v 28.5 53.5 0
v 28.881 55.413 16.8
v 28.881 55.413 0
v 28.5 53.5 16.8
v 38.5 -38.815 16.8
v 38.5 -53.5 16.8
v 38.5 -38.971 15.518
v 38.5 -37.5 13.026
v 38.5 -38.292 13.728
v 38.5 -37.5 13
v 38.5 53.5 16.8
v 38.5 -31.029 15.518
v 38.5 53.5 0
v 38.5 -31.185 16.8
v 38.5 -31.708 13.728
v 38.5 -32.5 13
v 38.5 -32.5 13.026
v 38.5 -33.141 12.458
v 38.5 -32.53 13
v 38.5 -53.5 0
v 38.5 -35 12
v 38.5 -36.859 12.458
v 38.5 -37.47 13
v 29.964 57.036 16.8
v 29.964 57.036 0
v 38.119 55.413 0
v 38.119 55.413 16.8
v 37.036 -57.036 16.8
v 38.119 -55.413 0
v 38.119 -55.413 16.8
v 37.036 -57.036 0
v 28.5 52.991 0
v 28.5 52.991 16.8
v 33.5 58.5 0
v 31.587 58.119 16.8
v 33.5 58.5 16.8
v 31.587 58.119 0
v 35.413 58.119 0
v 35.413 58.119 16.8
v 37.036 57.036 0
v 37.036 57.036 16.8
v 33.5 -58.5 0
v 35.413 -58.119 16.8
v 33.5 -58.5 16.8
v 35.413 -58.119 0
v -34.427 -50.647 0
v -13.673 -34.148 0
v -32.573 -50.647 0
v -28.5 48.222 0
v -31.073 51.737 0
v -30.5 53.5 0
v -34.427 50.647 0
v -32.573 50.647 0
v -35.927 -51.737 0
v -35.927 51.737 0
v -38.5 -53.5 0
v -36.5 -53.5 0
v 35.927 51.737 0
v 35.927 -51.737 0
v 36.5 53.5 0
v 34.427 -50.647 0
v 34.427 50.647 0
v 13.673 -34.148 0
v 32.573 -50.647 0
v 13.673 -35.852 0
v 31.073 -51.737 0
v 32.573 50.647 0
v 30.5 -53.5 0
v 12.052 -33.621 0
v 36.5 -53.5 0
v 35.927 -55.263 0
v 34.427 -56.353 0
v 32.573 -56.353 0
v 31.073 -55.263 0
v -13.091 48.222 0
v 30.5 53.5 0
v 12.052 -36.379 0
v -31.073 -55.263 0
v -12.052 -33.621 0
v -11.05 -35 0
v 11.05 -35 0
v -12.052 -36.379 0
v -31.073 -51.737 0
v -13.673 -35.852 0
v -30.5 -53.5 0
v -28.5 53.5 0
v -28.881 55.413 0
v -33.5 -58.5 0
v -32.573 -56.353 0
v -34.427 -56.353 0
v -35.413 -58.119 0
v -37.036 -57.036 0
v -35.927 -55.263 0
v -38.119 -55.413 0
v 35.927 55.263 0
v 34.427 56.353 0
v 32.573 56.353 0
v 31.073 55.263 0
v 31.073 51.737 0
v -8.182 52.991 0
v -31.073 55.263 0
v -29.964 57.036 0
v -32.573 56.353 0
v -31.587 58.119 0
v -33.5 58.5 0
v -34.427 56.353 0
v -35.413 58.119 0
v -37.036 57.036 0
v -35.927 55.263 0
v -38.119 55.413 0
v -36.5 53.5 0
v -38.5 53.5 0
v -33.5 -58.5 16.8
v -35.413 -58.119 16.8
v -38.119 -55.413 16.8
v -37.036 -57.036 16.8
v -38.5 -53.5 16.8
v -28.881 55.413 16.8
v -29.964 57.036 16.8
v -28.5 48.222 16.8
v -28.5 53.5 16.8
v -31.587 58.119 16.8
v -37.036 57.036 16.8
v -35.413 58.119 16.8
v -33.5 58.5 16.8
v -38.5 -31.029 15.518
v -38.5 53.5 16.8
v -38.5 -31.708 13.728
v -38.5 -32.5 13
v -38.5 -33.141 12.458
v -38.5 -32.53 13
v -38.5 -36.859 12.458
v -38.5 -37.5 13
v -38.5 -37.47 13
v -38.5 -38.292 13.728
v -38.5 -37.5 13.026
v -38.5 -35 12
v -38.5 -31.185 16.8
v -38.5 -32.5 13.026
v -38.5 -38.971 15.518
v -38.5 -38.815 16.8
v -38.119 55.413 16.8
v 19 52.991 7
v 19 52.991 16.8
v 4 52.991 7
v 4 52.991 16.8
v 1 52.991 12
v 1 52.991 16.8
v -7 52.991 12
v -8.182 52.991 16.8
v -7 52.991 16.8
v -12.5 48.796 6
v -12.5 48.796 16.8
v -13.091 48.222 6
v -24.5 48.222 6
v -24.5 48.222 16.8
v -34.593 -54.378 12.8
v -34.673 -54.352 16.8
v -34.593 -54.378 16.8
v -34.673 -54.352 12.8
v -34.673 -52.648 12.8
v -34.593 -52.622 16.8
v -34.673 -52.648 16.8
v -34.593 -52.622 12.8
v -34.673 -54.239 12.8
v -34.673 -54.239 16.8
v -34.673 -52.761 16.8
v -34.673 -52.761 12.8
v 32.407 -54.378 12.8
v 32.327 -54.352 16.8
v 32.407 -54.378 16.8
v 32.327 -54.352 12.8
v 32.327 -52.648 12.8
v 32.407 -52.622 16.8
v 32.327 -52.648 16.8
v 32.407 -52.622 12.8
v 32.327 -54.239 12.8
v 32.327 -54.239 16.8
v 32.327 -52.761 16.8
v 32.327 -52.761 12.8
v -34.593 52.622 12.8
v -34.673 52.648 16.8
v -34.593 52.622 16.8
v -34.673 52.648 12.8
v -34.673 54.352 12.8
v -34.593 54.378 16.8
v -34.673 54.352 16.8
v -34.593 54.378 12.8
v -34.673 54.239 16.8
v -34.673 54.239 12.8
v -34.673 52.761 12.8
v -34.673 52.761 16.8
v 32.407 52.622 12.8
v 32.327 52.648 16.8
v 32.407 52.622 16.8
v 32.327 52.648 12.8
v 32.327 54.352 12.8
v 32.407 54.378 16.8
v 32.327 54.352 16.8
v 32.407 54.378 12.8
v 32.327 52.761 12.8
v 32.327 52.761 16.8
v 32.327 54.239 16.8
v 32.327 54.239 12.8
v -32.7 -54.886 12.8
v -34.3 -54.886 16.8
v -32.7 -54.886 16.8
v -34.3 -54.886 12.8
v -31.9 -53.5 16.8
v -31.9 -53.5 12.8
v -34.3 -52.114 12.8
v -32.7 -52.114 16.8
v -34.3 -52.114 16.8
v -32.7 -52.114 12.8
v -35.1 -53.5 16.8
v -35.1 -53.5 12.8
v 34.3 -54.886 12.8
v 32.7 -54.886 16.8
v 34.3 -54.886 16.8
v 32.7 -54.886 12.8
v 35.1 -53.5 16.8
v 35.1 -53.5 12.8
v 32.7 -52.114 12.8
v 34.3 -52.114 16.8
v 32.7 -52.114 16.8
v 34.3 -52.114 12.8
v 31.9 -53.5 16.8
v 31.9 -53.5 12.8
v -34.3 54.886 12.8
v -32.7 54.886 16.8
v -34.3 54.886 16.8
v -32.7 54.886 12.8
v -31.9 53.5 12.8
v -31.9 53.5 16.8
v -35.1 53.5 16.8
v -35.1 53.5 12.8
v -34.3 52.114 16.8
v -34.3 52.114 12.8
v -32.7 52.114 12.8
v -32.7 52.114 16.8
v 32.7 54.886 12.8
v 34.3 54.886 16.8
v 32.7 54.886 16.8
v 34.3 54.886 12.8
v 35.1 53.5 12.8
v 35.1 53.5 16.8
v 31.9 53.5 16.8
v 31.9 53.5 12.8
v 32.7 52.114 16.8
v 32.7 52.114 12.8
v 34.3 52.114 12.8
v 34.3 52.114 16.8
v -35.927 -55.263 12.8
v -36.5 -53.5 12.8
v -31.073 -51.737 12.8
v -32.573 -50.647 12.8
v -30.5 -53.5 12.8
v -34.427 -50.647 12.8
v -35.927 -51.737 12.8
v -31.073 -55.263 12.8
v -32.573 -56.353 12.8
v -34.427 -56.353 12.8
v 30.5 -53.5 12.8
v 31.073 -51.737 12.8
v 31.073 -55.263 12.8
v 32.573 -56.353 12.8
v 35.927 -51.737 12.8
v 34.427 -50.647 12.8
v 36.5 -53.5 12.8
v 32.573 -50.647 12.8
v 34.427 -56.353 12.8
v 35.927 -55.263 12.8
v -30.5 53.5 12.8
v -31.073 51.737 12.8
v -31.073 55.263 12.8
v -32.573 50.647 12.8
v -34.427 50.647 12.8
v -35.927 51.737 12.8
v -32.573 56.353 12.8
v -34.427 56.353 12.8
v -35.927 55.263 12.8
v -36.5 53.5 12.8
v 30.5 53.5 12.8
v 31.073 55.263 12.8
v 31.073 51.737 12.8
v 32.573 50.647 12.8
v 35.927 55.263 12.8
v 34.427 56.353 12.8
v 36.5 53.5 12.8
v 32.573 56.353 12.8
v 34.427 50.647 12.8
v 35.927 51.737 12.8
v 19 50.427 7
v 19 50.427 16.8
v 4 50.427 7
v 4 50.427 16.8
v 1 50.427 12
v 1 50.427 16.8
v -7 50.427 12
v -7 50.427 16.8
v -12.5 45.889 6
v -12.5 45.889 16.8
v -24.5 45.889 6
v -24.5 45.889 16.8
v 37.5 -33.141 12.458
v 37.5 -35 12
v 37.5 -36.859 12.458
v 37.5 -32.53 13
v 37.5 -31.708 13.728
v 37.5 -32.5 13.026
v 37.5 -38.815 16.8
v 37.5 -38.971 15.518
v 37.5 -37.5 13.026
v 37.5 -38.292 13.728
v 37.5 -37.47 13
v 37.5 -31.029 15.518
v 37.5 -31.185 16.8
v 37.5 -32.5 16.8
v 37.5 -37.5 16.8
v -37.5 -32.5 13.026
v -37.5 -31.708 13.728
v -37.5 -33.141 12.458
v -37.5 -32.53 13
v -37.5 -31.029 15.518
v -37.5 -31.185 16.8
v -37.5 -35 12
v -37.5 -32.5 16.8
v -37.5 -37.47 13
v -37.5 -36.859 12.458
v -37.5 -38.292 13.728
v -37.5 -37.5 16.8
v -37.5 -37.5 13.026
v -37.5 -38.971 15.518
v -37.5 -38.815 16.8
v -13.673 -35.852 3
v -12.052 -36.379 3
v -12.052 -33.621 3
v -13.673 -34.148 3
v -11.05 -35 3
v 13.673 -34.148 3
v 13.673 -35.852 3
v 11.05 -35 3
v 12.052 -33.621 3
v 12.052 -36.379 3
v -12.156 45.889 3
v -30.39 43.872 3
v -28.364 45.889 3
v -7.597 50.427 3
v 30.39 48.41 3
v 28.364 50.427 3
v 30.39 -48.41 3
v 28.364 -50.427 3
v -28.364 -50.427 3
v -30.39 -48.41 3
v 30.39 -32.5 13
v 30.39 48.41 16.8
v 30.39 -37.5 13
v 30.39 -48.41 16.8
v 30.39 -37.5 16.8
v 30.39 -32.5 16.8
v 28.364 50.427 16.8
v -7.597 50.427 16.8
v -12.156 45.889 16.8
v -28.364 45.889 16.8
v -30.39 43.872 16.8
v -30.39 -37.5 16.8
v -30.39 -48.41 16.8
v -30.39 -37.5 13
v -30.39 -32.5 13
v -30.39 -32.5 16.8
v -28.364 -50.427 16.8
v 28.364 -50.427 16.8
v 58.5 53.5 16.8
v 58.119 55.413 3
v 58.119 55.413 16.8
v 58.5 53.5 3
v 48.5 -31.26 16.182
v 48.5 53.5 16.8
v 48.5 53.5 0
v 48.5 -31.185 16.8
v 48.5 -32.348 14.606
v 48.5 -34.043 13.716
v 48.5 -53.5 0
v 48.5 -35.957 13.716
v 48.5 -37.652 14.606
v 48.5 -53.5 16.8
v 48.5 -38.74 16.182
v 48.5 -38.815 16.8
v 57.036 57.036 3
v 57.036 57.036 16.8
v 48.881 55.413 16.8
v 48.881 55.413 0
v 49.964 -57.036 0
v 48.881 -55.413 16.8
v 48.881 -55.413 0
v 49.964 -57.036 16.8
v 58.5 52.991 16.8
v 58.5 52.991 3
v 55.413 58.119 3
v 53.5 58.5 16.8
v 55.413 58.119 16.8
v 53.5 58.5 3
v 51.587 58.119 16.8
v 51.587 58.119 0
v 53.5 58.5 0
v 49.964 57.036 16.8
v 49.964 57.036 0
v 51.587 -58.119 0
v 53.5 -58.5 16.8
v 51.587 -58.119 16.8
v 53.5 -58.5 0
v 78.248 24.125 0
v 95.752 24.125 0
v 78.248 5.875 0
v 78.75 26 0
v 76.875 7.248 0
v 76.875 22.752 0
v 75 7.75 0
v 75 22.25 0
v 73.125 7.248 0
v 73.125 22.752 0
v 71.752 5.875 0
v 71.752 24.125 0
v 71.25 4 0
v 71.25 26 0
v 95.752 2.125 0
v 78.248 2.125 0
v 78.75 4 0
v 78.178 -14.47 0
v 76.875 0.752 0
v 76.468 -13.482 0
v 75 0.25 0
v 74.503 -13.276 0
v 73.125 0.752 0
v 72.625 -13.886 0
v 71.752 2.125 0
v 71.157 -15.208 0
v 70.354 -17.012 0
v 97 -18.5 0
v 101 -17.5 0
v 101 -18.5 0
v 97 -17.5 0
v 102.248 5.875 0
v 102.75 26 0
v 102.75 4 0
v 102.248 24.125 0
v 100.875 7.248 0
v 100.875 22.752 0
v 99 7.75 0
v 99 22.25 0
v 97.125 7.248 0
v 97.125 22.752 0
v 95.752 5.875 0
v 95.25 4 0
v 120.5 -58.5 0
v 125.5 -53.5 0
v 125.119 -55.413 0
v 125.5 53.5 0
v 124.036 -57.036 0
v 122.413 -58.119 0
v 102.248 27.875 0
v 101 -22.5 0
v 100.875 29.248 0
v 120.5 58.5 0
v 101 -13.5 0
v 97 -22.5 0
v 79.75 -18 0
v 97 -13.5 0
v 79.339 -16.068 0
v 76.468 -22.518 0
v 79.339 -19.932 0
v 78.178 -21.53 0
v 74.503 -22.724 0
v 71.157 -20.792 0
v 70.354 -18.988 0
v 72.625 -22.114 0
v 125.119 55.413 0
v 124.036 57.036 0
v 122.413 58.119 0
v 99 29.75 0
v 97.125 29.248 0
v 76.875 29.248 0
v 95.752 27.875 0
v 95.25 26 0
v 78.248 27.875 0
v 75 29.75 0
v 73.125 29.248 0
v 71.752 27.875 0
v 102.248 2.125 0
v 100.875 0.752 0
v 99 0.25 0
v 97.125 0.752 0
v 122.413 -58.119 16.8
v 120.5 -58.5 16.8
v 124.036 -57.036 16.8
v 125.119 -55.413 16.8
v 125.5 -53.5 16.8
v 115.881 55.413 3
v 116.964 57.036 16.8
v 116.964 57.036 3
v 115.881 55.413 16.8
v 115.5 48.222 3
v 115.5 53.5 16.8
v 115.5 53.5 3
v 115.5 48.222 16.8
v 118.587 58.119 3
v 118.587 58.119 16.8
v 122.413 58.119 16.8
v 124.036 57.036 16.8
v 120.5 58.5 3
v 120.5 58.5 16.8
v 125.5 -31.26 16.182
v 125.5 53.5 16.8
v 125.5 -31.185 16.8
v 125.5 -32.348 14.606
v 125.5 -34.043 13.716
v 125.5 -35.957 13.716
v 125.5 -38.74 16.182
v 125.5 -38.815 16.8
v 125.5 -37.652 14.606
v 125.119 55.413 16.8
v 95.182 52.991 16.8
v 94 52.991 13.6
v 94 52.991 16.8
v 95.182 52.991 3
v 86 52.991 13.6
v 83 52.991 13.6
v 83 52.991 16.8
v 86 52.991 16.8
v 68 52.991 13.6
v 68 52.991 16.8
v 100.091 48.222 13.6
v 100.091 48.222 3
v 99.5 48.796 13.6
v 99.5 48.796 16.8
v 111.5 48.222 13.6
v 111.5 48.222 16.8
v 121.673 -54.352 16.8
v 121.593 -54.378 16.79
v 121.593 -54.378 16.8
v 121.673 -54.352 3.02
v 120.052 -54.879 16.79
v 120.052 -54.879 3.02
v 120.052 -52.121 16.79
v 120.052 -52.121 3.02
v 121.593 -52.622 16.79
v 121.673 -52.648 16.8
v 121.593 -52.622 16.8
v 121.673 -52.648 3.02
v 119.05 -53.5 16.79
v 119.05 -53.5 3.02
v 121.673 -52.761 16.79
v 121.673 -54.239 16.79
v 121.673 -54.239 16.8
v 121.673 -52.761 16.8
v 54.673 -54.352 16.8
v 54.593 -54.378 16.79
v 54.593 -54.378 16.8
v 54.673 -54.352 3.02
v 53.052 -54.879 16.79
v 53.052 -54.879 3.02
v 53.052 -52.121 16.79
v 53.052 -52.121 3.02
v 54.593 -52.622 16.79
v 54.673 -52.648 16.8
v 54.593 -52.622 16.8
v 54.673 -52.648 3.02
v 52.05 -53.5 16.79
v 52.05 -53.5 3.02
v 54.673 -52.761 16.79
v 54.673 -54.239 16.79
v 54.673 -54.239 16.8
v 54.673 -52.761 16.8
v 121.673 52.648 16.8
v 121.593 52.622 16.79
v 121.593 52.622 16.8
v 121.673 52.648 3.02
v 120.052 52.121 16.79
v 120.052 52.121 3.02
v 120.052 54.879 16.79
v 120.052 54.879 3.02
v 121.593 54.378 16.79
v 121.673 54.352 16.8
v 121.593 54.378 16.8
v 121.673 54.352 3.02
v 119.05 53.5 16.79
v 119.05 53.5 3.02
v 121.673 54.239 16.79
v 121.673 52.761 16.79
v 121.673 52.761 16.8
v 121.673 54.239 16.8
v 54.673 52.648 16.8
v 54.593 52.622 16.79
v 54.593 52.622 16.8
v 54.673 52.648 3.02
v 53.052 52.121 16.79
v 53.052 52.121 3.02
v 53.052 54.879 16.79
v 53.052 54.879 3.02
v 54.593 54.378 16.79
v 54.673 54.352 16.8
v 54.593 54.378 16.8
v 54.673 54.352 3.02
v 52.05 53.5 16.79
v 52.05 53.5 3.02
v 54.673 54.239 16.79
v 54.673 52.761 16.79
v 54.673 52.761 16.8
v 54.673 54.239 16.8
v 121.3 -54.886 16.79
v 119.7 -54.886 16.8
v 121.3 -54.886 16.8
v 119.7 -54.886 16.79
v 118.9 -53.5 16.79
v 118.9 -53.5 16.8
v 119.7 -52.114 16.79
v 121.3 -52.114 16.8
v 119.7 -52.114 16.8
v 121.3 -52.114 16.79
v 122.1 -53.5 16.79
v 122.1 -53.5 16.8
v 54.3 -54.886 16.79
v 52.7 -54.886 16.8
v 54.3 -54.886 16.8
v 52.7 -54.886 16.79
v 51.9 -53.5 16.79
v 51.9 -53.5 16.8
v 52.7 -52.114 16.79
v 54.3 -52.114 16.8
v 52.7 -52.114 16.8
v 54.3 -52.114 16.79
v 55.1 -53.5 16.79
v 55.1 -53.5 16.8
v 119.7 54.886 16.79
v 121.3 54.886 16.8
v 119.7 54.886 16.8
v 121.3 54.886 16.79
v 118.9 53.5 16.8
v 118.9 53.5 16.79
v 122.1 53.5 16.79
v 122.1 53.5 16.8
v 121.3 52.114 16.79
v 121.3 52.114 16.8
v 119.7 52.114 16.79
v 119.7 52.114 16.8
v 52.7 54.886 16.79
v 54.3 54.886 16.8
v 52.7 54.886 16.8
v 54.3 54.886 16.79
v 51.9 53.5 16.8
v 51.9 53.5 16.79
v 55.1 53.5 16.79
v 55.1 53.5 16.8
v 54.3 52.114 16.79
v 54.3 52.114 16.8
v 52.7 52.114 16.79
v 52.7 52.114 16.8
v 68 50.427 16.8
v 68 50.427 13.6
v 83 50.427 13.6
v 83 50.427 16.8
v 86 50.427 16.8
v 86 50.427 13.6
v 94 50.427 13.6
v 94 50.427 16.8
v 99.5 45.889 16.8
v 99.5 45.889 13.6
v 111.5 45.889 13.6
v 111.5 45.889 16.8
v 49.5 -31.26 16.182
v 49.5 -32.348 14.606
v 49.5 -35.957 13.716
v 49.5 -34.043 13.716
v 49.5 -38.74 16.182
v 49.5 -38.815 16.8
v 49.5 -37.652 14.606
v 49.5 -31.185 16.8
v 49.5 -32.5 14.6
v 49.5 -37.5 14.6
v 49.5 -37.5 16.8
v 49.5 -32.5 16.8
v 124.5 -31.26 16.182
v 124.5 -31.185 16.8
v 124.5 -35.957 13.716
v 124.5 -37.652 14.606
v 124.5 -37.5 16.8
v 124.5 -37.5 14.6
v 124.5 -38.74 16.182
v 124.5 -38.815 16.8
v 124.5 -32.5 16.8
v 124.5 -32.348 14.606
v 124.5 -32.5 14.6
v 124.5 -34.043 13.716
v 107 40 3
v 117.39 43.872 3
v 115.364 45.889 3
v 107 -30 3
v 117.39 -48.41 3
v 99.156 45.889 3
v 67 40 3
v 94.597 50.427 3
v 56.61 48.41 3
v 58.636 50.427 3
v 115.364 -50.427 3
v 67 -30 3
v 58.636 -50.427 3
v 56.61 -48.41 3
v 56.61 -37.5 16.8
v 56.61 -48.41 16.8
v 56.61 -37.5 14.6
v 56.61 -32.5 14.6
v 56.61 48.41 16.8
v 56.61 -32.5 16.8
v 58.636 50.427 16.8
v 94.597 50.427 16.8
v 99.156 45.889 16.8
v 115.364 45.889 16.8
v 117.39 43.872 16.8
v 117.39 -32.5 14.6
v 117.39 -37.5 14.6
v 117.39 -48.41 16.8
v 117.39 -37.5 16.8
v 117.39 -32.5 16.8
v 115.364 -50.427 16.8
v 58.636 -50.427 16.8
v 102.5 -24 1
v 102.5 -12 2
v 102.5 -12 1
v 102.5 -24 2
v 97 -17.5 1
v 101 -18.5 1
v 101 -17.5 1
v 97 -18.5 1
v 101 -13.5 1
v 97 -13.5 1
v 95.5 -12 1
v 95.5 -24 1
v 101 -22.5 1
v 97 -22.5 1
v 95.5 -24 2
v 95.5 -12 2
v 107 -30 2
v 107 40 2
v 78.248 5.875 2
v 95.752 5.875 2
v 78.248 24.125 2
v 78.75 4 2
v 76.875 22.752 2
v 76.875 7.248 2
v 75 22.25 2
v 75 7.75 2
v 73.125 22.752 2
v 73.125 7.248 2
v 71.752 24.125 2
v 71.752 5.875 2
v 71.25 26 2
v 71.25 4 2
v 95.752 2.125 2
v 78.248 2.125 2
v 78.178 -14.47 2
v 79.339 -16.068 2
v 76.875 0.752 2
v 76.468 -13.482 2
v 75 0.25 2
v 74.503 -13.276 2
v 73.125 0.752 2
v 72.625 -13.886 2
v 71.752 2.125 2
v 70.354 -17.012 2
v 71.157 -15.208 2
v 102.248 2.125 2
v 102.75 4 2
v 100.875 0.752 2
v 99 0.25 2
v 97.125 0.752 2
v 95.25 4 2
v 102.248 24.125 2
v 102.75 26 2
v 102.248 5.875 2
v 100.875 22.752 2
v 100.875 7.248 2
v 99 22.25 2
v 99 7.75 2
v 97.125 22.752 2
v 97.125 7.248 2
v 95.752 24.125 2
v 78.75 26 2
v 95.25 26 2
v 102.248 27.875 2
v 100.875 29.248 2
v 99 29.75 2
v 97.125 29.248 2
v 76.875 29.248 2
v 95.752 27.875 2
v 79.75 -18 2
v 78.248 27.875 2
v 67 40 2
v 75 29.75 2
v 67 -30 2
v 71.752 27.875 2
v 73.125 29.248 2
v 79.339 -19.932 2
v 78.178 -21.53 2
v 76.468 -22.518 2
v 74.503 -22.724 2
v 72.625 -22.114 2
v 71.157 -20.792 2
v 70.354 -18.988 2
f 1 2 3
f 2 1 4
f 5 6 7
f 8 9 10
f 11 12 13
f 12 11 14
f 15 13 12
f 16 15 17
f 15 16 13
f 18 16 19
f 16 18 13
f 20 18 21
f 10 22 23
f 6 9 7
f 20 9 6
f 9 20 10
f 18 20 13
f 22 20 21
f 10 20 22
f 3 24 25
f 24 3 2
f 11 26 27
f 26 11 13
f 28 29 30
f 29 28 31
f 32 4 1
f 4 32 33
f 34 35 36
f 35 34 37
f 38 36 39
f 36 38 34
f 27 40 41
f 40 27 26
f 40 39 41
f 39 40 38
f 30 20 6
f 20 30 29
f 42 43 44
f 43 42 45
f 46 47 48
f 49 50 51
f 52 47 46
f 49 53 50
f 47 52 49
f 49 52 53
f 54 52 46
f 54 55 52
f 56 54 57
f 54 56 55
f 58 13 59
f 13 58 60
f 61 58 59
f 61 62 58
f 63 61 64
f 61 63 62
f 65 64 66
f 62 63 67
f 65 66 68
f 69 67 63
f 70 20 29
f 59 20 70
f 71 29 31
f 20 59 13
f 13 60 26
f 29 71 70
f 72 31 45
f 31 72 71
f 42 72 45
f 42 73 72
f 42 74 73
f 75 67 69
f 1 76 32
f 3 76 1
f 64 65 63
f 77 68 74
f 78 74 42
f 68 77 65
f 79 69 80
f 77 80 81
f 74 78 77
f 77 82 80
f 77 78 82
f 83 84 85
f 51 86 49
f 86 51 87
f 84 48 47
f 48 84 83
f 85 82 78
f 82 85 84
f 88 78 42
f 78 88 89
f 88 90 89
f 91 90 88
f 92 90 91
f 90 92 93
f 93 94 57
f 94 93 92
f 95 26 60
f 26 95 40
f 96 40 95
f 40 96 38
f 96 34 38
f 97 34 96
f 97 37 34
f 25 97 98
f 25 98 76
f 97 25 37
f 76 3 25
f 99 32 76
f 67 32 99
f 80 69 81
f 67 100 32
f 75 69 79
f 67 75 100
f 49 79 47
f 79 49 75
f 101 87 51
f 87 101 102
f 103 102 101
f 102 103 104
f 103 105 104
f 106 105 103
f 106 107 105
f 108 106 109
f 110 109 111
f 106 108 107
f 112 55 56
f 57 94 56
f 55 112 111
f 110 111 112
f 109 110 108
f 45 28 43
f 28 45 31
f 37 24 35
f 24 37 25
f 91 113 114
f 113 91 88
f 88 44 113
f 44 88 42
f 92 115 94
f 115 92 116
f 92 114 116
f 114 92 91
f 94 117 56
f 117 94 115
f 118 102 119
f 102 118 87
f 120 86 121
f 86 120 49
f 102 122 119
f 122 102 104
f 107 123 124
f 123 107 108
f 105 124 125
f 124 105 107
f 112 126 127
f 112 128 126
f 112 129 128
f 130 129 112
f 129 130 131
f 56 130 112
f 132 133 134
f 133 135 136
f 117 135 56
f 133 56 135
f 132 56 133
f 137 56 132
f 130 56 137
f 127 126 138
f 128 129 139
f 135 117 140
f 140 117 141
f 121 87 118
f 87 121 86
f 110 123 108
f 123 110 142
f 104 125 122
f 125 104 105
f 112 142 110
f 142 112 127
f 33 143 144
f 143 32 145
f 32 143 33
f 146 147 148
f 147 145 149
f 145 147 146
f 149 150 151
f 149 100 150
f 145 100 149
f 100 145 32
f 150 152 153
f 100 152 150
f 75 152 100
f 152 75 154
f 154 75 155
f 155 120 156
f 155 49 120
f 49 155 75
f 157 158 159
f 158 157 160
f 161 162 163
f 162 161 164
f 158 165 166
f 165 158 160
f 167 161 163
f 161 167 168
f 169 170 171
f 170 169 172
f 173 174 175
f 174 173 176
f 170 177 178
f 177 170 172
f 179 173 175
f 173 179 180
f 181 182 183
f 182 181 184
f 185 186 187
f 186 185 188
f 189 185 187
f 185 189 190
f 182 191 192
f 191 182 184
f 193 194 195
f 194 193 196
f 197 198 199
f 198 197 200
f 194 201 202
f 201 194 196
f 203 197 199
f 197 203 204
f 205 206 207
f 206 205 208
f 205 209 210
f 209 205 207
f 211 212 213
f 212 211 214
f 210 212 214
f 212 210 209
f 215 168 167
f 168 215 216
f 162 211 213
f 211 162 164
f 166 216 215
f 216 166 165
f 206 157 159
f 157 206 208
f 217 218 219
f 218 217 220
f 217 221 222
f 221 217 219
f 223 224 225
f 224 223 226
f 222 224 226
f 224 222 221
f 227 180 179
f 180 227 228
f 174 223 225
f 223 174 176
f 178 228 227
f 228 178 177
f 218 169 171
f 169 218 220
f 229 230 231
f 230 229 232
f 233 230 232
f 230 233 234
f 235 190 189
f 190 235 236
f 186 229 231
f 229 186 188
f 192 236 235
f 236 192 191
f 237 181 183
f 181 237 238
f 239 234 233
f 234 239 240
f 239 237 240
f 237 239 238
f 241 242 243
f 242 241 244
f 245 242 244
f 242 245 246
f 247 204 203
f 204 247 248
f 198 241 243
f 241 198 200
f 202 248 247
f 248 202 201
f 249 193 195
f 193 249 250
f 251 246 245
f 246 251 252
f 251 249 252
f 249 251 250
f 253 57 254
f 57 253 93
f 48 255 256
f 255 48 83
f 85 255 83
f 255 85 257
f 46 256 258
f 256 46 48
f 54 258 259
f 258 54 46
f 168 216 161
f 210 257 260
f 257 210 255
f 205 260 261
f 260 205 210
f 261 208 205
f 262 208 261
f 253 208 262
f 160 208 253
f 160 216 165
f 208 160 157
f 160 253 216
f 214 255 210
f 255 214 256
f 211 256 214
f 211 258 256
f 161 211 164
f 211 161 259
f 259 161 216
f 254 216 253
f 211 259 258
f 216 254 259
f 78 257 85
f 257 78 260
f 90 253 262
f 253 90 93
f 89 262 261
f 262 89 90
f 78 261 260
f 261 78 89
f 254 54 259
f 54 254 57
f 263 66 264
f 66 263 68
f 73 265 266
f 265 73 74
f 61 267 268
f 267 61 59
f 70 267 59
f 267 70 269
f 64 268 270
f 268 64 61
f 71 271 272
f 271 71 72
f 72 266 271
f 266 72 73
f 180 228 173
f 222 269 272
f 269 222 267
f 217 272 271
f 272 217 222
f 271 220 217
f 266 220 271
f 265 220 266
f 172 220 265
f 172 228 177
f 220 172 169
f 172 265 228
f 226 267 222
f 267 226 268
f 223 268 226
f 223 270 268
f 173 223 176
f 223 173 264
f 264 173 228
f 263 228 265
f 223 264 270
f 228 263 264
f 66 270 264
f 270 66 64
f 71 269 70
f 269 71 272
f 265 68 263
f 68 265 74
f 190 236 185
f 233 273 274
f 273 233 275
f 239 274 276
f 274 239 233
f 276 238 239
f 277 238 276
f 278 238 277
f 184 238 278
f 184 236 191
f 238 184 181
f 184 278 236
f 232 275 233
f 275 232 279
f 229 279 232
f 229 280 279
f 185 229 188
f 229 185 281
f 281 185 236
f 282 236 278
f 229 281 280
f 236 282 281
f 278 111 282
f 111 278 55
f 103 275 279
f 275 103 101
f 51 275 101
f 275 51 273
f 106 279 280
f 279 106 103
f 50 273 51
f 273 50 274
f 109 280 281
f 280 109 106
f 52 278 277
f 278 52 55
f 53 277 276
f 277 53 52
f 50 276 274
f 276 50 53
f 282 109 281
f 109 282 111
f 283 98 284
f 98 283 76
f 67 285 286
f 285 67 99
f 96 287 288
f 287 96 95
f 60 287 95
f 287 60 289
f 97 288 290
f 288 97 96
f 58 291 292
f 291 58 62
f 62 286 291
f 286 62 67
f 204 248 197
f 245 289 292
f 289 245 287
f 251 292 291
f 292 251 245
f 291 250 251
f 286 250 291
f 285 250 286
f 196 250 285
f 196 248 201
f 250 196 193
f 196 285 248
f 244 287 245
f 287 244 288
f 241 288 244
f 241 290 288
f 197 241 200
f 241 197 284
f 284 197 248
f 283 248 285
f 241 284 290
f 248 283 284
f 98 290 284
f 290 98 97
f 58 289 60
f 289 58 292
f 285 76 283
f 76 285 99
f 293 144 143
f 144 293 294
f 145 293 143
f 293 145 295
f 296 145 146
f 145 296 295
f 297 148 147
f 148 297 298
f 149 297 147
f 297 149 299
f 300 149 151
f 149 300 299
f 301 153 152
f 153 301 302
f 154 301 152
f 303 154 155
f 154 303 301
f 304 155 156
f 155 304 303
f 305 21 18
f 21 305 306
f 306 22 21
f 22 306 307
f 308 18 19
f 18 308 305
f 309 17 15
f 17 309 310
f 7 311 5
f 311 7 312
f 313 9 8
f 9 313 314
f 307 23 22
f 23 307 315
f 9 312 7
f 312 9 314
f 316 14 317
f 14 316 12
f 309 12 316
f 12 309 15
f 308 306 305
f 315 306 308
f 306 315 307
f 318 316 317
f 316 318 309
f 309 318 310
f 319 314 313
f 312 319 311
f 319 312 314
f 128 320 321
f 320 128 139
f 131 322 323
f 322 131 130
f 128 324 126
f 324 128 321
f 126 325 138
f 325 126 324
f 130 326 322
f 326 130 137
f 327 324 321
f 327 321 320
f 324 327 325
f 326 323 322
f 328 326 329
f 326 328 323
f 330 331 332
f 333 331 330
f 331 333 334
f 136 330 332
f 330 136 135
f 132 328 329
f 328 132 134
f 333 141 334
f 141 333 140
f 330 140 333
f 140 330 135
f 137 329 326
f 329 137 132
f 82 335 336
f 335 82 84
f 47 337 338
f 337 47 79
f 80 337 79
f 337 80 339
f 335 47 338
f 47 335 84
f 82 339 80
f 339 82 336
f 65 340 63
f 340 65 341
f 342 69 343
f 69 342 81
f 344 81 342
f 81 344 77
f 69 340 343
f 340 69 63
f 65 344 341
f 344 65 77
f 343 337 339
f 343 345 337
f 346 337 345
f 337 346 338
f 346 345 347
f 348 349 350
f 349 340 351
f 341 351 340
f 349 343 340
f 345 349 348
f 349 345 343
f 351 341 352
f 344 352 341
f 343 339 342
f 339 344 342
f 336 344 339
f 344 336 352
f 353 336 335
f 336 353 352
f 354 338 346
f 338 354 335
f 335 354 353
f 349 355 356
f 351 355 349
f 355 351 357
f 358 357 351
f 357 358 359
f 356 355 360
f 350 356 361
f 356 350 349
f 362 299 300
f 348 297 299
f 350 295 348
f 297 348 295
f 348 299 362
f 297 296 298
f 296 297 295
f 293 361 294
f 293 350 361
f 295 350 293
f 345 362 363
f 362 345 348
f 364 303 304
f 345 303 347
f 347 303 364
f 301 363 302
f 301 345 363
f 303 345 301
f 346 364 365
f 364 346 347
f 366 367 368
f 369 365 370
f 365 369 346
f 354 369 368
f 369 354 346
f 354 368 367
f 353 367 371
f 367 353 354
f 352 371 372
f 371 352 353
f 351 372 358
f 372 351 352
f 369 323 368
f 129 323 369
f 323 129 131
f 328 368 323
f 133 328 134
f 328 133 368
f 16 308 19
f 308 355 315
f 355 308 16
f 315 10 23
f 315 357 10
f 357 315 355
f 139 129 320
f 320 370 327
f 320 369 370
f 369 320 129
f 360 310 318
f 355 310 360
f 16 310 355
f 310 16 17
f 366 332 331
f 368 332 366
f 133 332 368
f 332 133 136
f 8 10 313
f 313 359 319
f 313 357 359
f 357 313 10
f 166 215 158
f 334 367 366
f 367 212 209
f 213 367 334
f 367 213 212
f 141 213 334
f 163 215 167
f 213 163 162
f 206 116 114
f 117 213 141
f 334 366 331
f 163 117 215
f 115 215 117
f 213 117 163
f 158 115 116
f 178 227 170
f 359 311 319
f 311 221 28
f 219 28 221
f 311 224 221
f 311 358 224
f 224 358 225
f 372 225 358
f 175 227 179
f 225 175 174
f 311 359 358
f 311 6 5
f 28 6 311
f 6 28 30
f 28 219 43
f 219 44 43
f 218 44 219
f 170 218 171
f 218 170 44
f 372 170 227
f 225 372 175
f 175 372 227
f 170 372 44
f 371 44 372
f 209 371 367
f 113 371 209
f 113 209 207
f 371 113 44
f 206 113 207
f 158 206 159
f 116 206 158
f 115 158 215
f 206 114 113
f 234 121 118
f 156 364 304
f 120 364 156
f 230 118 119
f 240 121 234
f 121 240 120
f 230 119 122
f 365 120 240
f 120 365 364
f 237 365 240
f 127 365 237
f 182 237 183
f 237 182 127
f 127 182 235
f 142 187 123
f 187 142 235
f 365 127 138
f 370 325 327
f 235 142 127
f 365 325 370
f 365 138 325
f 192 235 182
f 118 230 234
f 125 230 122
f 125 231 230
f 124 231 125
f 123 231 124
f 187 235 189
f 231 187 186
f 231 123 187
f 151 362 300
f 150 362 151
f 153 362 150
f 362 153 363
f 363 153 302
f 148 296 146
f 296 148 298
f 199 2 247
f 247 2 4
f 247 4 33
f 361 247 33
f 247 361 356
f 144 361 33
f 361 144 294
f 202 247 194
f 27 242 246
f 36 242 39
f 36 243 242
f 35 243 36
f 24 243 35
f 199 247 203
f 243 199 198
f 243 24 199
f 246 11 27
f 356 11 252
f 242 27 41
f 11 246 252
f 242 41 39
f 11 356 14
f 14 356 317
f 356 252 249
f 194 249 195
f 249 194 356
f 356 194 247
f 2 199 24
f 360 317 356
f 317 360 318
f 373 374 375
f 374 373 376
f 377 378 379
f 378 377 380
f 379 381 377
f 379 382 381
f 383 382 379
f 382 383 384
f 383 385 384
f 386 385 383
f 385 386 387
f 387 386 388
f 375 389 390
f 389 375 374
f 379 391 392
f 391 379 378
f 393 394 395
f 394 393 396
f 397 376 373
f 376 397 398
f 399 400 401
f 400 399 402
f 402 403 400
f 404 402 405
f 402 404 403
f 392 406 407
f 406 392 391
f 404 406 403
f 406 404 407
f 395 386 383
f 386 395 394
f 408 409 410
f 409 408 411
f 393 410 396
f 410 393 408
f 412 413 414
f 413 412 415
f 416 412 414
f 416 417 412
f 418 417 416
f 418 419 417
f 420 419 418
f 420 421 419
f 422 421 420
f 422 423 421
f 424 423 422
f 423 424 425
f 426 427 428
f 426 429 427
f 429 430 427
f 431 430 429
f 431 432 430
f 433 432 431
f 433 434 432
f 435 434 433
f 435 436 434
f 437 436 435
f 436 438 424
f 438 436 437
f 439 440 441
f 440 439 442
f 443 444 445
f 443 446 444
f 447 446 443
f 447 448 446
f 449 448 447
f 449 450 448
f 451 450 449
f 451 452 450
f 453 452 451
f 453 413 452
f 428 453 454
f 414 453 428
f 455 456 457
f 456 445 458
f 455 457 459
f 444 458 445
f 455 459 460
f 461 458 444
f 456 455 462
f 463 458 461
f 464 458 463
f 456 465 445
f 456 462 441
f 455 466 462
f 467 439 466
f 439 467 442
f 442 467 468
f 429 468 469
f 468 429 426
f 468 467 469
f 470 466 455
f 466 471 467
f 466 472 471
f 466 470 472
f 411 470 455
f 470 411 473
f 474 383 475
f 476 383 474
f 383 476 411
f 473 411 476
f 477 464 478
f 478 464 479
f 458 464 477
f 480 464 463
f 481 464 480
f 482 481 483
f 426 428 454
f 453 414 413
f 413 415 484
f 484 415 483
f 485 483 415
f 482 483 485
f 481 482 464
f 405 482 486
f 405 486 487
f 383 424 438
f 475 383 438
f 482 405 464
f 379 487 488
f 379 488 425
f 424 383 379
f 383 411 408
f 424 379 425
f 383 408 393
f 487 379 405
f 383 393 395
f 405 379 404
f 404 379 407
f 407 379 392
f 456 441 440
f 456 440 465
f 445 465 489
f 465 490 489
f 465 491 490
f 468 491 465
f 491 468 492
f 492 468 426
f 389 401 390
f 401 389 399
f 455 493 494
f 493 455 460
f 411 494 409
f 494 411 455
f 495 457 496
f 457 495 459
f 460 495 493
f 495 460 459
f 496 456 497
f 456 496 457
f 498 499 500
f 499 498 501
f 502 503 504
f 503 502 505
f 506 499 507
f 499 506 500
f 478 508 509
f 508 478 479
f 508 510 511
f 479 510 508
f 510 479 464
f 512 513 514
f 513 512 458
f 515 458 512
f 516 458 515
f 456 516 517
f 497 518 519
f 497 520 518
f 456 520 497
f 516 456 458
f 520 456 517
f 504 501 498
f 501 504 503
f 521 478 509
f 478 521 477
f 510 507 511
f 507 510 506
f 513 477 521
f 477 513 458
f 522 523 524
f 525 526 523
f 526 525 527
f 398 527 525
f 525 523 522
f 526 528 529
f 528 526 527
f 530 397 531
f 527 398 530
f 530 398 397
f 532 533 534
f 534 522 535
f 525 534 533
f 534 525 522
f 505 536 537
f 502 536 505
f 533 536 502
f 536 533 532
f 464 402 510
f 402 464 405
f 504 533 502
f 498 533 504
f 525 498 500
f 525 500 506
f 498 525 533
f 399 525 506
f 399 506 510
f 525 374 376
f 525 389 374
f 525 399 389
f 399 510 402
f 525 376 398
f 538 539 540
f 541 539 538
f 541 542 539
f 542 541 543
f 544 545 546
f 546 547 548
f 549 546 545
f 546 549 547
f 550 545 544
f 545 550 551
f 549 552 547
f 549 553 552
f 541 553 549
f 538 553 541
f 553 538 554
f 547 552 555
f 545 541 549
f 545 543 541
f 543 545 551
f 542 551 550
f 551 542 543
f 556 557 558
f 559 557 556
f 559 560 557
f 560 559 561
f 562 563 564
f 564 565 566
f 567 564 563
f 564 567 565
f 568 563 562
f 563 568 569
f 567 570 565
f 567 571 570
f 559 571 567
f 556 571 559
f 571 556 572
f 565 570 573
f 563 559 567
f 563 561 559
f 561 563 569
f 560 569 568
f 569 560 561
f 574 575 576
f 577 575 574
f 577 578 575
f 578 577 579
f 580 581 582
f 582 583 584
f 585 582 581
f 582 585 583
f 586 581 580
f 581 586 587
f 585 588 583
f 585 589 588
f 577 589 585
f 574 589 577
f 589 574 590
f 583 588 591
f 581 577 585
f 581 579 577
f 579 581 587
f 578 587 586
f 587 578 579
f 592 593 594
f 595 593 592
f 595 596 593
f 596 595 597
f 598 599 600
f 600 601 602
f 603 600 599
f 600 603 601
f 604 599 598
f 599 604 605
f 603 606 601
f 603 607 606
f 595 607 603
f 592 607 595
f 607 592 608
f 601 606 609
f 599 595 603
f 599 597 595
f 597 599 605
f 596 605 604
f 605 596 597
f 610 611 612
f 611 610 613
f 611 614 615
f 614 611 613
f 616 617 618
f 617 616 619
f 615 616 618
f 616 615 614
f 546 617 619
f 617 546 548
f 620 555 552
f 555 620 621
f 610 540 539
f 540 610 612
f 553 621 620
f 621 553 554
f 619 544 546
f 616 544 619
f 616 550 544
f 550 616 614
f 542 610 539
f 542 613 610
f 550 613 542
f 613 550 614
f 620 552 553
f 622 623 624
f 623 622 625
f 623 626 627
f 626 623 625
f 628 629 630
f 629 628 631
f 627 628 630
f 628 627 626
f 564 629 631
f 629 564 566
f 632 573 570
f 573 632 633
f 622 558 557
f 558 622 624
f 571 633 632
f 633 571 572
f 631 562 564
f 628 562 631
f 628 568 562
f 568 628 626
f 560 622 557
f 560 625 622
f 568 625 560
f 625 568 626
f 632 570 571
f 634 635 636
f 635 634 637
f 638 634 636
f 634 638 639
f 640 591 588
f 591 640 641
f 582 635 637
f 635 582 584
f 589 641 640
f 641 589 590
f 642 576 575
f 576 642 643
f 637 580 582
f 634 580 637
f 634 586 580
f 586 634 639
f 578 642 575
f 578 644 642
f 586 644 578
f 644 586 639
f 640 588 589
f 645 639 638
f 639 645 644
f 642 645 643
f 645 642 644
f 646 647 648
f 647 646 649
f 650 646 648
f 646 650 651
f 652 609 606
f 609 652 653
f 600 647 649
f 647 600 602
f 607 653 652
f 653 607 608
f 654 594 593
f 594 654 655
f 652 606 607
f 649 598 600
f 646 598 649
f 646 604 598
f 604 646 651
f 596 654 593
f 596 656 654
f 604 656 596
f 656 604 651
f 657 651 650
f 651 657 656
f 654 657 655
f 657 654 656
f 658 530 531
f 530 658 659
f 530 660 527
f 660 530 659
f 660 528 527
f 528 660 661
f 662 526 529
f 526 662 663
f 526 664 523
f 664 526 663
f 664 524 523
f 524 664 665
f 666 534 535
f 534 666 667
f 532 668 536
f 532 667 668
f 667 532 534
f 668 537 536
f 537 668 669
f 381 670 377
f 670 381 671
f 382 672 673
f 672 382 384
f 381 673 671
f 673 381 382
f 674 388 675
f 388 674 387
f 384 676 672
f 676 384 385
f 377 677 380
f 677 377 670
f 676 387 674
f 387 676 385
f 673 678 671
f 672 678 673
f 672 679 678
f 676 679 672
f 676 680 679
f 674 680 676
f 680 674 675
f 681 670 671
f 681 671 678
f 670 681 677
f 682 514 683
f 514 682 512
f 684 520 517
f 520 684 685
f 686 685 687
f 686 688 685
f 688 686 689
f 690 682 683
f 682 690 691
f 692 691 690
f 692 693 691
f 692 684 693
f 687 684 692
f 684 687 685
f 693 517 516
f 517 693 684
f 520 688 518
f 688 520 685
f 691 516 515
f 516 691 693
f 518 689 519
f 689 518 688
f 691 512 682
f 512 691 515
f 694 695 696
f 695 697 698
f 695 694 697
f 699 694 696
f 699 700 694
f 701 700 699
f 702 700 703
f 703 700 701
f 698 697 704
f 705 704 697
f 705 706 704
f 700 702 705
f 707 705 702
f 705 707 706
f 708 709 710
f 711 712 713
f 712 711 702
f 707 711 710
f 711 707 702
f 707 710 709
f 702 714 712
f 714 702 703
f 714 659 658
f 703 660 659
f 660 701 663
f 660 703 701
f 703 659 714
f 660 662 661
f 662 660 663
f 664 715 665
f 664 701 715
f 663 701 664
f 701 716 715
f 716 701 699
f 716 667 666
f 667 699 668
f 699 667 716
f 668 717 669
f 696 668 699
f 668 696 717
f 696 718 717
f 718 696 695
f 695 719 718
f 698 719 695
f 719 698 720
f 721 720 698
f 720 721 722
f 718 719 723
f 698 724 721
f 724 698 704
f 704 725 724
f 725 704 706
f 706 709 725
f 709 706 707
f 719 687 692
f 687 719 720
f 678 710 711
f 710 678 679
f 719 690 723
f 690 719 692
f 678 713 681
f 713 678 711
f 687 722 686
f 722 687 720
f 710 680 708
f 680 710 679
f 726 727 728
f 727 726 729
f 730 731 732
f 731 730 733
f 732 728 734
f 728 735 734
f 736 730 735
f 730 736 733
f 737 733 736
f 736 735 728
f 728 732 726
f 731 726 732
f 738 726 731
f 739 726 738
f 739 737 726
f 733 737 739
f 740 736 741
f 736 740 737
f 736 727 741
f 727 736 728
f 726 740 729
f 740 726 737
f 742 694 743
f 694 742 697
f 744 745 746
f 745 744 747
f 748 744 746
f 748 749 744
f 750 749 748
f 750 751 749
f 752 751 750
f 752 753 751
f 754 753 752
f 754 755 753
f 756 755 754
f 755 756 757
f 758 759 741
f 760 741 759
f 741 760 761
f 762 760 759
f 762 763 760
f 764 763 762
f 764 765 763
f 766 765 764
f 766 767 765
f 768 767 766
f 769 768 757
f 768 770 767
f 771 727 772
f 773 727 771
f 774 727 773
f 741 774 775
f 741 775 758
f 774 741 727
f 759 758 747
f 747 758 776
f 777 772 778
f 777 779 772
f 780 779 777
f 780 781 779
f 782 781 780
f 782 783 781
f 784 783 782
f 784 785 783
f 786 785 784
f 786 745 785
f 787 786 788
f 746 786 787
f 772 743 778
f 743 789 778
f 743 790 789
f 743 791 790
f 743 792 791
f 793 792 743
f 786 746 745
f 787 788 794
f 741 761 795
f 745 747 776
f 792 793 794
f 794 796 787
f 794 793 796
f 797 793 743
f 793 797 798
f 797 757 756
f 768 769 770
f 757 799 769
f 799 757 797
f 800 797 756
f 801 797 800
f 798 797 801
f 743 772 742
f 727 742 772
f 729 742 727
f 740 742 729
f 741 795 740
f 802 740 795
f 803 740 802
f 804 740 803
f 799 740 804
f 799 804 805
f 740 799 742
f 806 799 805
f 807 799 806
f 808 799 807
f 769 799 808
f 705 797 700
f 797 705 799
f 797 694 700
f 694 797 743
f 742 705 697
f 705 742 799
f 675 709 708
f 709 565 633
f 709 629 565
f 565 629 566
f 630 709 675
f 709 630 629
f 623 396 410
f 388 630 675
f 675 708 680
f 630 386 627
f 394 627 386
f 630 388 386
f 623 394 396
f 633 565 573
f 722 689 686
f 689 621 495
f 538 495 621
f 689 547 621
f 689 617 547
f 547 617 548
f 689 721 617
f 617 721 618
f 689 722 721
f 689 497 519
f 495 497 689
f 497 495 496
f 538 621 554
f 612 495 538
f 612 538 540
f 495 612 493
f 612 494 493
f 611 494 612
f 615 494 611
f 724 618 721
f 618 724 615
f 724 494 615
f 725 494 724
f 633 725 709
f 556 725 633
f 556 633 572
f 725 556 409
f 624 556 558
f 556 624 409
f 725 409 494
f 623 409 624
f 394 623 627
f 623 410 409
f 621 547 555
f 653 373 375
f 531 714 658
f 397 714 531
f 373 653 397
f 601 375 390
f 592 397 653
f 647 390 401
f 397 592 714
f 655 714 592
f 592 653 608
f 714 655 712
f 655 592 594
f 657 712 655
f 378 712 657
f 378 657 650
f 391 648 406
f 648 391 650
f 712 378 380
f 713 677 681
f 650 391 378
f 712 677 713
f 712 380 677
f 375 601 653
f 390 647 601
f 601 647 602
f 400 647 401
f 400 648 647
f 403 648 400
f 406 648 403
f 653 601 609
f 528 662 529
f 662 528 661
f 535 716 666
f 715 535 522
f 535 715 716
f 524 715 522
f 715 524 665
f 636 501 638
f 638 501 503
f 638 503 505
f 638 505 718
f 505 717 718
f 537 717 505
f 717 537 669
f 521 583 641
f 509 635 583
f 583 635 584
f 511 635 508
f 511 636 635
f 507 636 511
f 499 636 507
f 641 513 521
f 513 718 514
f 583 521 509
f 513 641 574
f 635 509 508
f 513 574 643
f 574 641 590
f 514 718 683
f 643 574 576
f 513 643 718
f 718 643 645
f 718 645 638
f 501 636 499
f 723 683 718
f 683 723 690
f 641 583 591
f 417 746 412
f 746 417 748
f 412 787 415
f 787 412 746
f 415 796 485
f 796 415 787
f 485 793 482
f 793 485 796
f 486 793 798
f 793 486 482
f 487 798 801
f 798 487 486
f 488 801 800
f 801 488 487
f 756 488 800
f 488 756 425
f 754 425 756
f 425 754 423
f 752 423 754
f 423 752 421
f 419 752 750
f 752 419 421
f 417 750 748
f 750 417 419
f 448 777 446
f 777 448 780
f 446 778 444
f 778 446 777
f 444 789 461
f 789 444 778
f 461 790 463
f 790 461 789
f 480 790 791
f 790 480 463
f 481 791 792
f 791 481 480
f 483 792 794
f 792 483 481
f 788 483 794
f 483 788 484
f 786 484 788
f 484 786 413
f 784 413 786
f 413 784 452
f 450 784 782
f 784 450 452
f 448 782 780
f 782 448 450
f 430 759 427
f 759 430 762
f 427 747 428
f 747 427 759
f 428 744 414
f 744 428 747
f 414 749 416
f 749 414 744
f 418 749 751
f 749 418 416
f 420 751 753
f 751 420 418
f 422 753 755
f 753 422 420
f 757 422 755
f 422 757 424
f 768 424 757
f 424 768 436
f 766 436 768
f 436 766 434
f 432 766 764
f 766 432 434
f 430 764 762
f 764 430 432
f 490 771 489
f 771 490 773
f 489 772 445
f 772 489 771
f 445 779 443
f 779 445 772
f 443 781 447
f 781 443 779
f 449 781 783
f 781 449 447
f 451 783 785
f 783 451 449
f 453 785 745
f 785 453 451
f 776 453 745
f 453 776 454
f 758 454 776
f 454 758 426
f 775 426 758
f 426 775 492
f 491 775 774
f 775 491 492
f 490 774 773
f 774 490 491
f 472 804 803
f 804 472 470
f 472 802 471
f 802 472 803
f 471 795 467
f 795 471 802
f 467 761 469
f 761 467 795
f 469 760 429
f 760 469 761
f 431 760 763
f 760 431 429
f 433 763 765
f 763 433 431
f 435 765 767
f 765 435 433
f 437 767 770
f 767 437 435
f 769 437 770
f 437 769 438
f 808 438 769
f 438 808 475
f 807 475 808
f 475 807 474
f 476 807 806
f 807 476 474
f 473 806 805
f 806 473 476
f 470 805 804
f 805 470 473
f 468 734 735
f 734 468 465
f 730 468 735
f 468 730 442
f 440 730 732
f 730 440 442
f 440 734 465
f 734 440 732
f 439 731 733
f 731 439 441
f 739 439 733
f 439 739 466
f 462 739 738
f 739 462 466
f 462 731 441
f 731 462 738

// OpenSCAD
$e = 0.01;

panel_cols = [18, 42];
knob_offsets = [54, 76];
led_button_offset = 32;

module panel_cuts() {
  translate([-board_width / 2, -board_length / 2]) {
    // function
    translate([panel_cols[0], led_button_offset]) circle(9.5/2);


    // LEDs
    translate([panel_cols[1], led_button_offset]) {
      translate([-2, -4.5]) square([4, 4]);
      translate([-2, 0.5]) square([4, 4]);
    }

    // knobs
    for (y = knob_offsets) for (x = panel_cols) {
      translate([x, y]) circle(7.5/2);
    }
  }
}

module panel_relief(thickness) {
  mount_thickness = 2;
  led_w = 7;
  led_h = 12;
  led_thickness = 1;

  // LEDs protrude slightly past the pots
  translate([-board_width / 2, -board_length / 2, 0]) {
    translate([panel_cols[1] - led_w/2, led_button_offset - led_h/2, led_thickness])
      cube([led_w, led_h, thickness]);
  }

  // slim panel overall where components pass through
  translate([-20, -30, mount_thickness])
    cube([40, 70, thickness]);
}

board_width = 60;
board_length = 100;
slack = 0.5;
sidewall = 8;
width = board_width + 2 * slack + 2 * sidewall;
length = board_length + 2 * slack + 2 * sidewall;
corner_r = 5;
m3_thread = 2.9;
m3_shaft = 3.2;
m3_cap = 6;
layer = 0.2;

module screws(d, h) {
  r = d / 2;
  for (ky = [-1, 1]) for (kx = [-1, 1]) {
    translate([kx * (width/2 - corner_r), ky * (length/2 - corner_r), 0])
      cylinder(r = r, h = h);
  }
}

module pcb() {
  bevel = 2;
  bite_y = 4.5;
  bite_x = 18;
  mirror ([1, 0]) translate([-board_width/2, -board_length/2]) {
    polygon([
      [bevel, 0], [board_width - bevel, 0],
      [board_width, bevel], [board_width, board_length - bite_y - bevel],
      [board_width - bevel, board_length - bite_y],
      [board_width - bite_x, board_length - bite_y],
      [board_width - bite_x - bite_y, board_length],
      [bevel, board_length], [0, board_length - bevel],
      [0, bevel]
    ]);
  }
}

module three_wall(depth) {
  loci = [[1, 1], [1, -1], [-1, -1], [-1, 1]];

  for (i = [0:2]) {
    hull() {
      for (ky = [loci[i].y, loci[i+1].y]) {
        for (kx = [loci[i].x, loci[i+1].x]) {
          translate([kx * (width / 2 - corner_r), ky * (length / 2 - corner_r), 0])
            cylinder(r = corner_r, h = depth);
        }
      }
    }
  }
}

module outset_pcb(amount) {
  kx = (width + 2 * amount) / width;
  ky = (length + 2 * amount) / length;
  scale([kx, ky]) pcb();
}

pcb_thickness = 1.6;
wall = 3;
sheet_thickness = 3;
component_height = 10;
arduino_depth = 16;
height = 2 * sheet_thickness + component_height + pcb_thickness
       + arduino_depth;
lid_height = height / 2;
base_height = height - lid_height;
antenna_separation = 75;

module shell() {
  difference() {
    union() {
      // thick walls on three sides
      three_wall(height);
      // thin wall for connector side
      linear_extrude(height = height) outset_pcb(wall + slack);
      // rounded rectangle front panel
      translate([0, 0, height - sheet_thickness])
        hull() three_wall(sheet_thickness);
    }

    // volume for circuitry
    translate([0, 0, sheet_thickness])
      linear_extrude(height = height - 2 * sheet_thickness)
        outset_pcb(slack);

    // screw holes
    translate([0, 0, -$e]) screws(m3_thread, height - sheet_thickness - $e);
    translate([0, 0, -$e]) screws(m3_shaft, base_height + 2*$e);
    translate([0, 0, -$e]) screws(m3_cap, base_height + $e - 4);

    // cutouts for connectors
    // datum is bottom left centre of circuit board
    // because we just chop these out along the y axis
    translate([
      board_width / 2,
      0,
      height - sheet_thickness - component_height - pcb_thickness
    ]) {
      translate([-26, 0, -12]) cube([15, length, 13]);
      translate([-37, 0, -7]) cube([8, length, 8]);
      translate([-54.5, 0, -13]) cube([12, length, 14]);
    }

    // channel for antenna clips
    // these are mostly a 5mm cylinder, with a 5mm square section around the
    // screw hole. For simplicity of printing (because vertical holes never
    // come out round) and modelling, let's make these square channels.
    // Also need to allow about 1mm of height for the star washer so assume
    // 6mm down from pcb underside.
    translate([
      -width / 2 - $e,
      -board_length / 2 + 15 - 2.5,
      height - sheet_thickness - component_height - pcb_thickness - 6
    ]) cube([width + 2 * $e, 5, 6]);

    for (m = [0, 1]) mirror([m, 0, 0]) {
      translate([
        antenna_separation / 2,
        -board_length / 2 + 15,
        height - sheet_thickness - component_height - pcb_thickness - 3
      ]) rotate([0, 90, 0]) cylinder(r = 4, h = 100);
    }

    // screws for UNC mount
    for (m = [0, 1]) mirror([m, 0, 0]) {
      translate([-25 / 2, -board_length / 2 + 15, -$e])
        cylinder(r = m3_thread / 2, h = height / 2);
    }
  }
}

module base() {
  difference() {
    shell();
    translate([-width / 2 - $e, -length / 2 - $e, base_height])
      cube([width + 2 * $e, length + 2 * $e, height]);
  }
}

module lid() {
  difference() {
    translate([0, 0, height]) rotate([0, 180, 0]) shell();
    translate([-width / 2 - $e, -length / 2 - $e, lid_height])
      cube([width + 2 * $e, length + 2 * $e, height]);
    translate([0, 0, -$e]) linear_extrude(height = height) panel_cuts();
    panel_relief(height);
  }
}

base();
translate([width + 10, 0, 0]) lid();
